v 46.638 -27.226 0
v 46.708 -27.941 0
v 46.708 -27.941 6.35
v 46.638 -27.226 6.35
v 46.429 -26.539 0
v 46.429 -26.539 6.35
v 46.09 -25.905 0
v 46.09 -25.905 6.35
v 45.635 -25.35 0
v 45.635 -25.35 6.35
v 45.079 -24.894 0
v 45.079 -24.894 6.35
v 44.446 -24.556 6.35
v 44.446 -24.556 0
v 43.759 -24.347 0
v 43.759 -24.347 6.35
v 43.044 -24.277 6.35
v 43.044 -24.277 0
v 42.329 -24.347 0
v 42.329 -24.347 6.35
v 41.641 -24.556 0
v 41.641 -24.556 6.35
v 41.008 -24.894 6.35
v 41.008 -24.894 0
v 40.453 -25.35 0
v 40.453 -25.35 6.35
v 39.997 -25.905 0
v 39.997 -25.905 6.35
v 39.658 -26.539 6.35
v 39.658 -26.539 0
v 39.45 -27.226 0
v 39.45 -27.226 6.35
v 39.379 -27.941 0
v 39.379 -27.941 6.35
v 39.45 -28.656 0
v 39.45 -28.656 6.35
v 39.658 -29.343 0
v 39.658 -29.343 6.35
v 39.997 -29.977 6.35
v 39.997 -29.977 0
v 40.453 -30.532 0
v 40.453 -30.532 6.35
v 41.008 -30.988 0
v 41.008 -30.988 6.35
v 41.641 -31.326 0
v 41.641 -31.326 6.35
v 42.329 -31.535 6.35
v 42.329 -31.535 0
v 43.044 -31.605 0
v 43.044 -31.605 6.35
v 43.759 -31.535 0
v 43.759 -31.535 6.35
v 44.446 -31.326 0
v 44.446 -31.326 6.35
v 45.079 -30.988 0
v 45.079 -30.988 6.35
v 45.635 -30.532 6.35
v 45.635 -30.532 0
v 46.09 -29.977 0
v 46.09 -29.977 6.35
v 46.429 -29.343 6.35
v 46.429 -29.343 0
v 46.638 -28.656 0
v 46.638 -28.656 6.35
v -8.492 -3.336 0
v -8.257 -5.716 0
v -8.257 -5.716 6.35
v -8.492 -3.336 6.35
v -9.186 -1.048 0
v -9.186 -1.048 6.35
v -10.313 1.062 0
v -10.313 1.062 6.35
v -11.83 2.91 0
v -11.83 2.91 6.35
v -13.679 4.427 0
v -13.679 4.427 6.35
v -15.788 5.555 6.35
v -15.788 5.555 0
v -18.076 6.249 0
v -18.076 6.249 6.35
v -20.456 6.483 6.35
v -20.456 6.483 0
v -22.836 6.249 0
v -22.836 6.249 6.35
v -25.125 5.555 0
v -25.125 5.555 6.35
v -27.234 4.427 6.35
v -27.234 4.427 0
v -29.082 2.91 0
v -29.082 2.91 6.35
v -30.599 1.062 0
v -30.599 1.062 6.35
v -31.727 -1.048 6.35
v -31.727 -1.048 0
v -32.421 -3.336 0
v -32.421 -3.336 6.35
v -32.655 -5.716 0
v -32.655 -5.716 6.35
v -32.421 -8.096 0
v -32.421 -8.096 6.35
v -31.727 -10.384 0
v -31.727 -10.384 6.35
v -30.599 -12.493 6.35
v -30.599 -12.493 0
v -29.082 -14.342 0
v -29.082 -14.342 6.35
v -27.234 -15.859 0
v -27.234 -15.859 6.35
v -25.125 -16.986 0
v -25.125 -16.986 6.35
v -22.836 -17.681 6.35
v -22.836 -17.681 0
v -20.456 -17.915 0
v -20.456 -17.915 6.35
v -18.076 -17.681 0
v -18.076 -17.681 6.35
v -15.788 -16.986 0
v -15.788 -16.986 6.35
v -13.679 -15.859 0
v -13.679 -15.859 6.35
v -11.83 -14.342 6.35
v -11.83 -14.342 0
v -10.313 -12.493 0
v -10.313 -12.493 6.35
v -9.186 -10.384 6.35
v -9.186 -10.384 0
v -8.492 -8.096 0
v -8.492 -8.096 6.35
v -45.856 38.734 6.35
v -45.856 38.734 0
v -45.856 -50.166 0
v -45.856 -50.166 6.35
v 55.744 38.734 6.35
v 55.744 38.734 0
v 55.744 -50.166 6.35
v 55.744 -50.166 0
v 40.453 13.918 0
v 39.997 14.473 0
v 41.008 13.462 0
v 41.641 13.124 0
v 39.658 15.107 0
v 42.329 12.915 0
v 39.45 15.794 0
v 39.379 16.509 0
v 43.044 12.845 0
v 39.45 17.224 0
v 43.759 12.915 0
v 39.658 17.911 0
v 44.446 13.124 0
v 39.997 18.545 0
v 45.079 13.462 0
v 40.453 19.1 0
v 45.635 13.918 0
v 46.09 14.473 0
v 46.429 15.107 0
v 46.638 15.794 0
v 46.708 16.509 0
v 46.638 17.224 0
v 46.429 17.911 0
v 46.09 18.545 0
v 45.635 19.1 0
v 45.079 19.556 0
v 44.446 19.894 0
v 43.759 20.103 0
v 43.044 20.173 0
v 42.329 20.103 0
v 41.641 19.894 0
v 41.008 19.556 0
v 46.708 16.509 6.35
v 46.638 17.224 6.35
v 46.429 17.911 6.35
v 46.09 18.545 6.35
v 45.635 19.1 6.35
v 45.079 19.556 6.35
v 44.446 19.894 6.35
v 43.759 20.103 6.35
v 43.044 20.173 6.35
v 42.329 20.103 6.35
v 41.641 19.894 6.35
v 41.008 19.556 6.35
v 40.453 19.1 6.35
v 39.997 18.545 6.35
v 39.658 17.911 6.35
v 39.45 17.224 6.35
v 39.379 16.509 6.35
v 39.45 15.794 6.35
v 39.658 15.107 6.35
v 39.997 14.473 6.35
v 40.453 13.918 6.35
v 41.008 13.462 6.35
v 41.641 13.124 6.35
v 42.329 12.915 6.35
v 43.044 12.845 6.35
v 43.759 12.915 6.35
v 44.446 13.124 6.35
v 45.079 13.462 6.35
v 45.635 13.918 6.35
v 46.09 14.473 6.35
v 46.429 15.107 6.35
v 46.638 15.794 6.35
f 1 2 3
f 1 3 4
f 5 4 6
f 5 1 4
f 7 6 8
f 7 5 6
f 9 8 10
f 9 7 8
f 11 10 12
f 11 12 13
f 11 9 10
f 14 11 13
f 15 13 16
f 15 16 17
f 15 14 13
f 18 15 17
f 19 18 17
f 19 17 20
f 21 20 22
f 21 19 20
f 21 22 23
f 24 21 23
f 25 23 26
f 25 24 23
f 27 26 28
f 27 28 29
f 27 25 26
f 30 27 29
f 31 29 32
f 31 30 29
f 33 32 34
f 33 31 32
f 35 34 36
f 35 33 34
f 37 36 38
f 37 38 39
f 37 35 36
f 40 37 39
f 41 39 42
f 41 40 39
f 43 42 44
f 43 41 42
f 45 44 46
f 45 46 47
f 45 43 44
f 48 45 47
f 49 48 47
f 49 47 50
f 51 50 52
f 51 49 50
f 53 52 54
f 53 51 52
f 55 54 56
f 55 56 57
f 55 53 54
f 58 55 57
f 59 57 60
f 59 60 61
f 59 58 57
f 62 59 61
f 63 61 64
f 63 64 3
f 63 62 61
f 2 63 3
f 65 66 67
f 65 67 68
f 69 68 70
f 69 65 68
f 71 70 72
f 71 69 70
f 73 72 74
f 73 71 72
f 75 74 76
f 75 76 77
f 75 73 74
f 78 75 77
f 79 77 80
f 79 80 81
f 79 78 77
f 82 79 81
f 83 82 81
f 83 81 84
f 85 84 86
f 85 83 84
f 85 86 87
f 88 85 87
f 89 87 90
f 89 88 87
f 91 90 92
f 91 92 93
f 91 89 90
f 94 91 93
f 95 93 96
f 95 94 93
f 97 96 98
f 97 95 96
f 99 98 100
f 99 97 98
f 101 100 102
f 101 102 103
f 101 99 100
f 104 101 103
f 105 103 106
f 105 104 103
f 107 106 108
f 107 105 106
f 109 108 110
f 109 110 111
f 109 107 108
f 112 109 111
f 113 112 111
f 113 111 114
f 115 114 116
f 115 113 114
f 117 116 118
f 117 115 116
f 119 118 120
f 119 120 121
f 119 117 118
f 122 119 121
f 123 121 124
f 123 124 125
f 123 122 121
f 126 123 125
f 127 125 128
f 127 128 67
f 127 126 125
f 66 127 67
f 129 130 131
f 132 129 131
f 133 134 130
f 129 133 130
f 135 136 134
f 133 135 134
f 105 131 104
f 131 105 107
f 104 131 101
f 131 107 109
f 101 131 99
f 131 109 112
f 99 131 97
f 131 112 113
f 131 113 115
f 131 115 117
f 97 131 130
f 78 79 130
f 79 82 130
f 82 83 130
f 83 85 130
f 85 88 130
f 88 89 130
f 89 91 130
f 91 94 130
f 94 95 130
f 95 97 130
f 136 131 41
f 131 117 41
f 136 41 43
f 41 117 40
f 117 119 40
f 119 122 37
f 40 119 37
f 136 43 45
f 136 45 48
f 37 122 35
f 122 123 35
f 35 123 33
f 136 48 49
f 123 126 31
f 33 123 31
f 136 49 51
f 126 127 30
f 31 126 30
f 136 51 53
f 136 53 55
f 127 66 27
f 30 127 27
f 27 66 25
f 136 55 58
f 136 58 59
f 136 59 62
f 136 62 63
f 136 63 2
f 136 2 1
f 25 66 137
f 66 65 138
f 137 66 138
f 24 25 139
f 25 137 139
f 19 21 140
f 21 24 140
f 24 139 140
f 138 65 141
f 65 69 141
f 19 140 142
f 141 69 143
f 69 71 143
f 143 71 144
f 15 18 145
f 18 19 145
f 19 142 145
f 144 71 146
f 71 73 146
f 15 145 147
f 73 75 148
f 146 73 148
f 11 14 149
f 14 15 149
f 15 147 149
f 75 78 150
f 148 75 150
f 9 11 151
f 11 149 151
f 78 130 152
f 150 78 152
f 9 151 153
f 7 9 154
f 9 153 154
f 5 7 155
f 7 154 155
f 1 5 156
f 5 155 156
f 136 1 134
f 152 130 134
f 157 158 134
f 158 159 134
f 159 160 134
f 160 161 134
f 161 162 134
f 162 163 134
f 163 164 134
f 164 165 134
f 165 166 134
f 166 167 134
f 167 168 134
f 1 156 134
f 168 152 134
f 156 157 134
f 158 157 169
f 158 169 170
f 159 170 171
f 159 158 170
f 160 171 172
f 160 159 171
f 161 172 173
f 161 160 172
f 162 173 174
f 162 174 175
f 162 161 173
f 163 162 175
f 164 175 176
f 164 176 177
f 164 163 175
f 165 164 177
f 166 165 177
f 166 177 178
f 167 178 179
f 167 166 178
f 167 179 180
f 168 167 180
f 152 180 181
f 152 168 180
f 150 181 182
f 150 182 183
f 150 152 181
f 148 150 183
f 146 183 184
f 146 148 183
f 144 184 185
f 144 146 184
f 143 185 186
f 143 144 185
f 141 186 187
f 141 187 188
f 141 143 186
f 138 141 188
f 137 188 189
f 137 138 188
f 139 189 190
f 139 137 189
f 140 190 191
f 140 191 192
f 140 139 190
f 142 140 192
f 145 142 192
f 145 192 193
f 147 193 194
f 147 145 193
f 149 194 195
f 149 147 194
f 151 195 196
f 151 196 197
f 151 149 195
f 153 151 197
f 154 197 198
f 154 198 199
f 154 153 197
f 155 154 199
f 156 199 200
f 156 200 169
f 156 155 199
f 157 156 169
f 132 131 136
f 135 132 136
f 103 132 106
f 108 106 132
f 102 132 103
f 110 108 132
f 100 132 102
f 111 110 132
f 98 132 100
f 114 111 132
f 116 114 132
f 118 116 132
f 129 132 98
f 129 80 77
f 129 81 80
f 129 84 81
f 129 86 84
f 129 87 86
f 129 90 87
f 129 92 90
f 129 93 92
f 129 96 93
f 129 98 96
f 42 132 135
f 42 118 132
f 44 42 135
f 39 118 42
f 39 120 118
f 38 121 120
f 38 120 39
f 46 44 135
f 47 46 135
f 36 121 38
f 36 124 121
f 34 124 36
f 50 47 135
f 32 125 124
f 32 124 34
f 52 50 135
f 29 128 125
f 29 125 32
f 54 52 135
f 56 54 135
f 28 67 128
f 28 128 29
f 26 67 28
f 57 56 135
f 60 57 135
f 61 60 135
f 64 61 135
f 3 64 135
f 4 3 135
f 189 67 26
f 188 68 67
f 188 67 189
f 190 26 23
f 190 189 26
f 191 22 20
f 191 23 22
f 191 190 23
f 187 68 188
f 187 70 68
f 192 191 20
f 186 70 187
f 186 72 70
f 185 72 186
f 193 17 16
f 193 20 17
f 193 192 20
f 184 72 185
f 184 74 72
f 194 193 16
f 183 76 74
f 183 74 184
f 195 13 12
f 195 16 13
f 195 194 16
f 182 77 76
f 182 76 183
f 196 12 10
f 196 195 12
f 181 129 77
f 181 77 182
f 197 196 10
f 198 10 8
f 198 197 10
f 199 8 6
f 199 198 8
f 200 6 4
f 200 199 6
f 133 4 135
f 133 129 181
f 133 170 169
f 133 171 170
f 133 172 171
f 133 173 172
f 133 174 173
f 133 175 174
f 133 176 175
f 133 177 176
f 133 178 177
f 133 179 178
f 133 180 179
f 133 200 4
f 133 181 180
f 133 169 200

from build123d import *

# Parameters (mm, degrees)
F0_R     = 3.6643363337
F0_R_2   = 12.1990402392
F1_DEPTH = 6.35


# Not quite as in the source:
# - a feature names something its author has since deleted; it is built from what else it names


with BuildPart() as f1:
    # F0 (on Top) → F1 (new body)
    with BuildSketch(Plane.XY):
        Polygon((4.9436837435, 38.7340840895), (-45.8563162565, 38.7340840895), (-45.8563162565, -50.1659159105), (4.9436837435, -50.1659159105), (30.3436837435, -50.1659159105), (55.7436837435, -50.1659159105), (55.7436837435, -5.7159159105), (55.7436837435, 38.7340840895), (30.3436837435, 38.7340840895), align=None)
        with Locations((43.0436837435, -27.9409159105)):
            Circle(F0_R, mode=Mode.SUBTRACT)
        with Locations((-20.4563162565, -5.7159159105)):
            Circle(F0_R_2, mode=Mode.SUBTRACT)
        with Locations((43.0436837435, 16.5090840895)):
            Circle(F0_R, mode=Mode.SUBTRACT)
    extrude(amount=F1_DEPTH)


solid = f1.part
